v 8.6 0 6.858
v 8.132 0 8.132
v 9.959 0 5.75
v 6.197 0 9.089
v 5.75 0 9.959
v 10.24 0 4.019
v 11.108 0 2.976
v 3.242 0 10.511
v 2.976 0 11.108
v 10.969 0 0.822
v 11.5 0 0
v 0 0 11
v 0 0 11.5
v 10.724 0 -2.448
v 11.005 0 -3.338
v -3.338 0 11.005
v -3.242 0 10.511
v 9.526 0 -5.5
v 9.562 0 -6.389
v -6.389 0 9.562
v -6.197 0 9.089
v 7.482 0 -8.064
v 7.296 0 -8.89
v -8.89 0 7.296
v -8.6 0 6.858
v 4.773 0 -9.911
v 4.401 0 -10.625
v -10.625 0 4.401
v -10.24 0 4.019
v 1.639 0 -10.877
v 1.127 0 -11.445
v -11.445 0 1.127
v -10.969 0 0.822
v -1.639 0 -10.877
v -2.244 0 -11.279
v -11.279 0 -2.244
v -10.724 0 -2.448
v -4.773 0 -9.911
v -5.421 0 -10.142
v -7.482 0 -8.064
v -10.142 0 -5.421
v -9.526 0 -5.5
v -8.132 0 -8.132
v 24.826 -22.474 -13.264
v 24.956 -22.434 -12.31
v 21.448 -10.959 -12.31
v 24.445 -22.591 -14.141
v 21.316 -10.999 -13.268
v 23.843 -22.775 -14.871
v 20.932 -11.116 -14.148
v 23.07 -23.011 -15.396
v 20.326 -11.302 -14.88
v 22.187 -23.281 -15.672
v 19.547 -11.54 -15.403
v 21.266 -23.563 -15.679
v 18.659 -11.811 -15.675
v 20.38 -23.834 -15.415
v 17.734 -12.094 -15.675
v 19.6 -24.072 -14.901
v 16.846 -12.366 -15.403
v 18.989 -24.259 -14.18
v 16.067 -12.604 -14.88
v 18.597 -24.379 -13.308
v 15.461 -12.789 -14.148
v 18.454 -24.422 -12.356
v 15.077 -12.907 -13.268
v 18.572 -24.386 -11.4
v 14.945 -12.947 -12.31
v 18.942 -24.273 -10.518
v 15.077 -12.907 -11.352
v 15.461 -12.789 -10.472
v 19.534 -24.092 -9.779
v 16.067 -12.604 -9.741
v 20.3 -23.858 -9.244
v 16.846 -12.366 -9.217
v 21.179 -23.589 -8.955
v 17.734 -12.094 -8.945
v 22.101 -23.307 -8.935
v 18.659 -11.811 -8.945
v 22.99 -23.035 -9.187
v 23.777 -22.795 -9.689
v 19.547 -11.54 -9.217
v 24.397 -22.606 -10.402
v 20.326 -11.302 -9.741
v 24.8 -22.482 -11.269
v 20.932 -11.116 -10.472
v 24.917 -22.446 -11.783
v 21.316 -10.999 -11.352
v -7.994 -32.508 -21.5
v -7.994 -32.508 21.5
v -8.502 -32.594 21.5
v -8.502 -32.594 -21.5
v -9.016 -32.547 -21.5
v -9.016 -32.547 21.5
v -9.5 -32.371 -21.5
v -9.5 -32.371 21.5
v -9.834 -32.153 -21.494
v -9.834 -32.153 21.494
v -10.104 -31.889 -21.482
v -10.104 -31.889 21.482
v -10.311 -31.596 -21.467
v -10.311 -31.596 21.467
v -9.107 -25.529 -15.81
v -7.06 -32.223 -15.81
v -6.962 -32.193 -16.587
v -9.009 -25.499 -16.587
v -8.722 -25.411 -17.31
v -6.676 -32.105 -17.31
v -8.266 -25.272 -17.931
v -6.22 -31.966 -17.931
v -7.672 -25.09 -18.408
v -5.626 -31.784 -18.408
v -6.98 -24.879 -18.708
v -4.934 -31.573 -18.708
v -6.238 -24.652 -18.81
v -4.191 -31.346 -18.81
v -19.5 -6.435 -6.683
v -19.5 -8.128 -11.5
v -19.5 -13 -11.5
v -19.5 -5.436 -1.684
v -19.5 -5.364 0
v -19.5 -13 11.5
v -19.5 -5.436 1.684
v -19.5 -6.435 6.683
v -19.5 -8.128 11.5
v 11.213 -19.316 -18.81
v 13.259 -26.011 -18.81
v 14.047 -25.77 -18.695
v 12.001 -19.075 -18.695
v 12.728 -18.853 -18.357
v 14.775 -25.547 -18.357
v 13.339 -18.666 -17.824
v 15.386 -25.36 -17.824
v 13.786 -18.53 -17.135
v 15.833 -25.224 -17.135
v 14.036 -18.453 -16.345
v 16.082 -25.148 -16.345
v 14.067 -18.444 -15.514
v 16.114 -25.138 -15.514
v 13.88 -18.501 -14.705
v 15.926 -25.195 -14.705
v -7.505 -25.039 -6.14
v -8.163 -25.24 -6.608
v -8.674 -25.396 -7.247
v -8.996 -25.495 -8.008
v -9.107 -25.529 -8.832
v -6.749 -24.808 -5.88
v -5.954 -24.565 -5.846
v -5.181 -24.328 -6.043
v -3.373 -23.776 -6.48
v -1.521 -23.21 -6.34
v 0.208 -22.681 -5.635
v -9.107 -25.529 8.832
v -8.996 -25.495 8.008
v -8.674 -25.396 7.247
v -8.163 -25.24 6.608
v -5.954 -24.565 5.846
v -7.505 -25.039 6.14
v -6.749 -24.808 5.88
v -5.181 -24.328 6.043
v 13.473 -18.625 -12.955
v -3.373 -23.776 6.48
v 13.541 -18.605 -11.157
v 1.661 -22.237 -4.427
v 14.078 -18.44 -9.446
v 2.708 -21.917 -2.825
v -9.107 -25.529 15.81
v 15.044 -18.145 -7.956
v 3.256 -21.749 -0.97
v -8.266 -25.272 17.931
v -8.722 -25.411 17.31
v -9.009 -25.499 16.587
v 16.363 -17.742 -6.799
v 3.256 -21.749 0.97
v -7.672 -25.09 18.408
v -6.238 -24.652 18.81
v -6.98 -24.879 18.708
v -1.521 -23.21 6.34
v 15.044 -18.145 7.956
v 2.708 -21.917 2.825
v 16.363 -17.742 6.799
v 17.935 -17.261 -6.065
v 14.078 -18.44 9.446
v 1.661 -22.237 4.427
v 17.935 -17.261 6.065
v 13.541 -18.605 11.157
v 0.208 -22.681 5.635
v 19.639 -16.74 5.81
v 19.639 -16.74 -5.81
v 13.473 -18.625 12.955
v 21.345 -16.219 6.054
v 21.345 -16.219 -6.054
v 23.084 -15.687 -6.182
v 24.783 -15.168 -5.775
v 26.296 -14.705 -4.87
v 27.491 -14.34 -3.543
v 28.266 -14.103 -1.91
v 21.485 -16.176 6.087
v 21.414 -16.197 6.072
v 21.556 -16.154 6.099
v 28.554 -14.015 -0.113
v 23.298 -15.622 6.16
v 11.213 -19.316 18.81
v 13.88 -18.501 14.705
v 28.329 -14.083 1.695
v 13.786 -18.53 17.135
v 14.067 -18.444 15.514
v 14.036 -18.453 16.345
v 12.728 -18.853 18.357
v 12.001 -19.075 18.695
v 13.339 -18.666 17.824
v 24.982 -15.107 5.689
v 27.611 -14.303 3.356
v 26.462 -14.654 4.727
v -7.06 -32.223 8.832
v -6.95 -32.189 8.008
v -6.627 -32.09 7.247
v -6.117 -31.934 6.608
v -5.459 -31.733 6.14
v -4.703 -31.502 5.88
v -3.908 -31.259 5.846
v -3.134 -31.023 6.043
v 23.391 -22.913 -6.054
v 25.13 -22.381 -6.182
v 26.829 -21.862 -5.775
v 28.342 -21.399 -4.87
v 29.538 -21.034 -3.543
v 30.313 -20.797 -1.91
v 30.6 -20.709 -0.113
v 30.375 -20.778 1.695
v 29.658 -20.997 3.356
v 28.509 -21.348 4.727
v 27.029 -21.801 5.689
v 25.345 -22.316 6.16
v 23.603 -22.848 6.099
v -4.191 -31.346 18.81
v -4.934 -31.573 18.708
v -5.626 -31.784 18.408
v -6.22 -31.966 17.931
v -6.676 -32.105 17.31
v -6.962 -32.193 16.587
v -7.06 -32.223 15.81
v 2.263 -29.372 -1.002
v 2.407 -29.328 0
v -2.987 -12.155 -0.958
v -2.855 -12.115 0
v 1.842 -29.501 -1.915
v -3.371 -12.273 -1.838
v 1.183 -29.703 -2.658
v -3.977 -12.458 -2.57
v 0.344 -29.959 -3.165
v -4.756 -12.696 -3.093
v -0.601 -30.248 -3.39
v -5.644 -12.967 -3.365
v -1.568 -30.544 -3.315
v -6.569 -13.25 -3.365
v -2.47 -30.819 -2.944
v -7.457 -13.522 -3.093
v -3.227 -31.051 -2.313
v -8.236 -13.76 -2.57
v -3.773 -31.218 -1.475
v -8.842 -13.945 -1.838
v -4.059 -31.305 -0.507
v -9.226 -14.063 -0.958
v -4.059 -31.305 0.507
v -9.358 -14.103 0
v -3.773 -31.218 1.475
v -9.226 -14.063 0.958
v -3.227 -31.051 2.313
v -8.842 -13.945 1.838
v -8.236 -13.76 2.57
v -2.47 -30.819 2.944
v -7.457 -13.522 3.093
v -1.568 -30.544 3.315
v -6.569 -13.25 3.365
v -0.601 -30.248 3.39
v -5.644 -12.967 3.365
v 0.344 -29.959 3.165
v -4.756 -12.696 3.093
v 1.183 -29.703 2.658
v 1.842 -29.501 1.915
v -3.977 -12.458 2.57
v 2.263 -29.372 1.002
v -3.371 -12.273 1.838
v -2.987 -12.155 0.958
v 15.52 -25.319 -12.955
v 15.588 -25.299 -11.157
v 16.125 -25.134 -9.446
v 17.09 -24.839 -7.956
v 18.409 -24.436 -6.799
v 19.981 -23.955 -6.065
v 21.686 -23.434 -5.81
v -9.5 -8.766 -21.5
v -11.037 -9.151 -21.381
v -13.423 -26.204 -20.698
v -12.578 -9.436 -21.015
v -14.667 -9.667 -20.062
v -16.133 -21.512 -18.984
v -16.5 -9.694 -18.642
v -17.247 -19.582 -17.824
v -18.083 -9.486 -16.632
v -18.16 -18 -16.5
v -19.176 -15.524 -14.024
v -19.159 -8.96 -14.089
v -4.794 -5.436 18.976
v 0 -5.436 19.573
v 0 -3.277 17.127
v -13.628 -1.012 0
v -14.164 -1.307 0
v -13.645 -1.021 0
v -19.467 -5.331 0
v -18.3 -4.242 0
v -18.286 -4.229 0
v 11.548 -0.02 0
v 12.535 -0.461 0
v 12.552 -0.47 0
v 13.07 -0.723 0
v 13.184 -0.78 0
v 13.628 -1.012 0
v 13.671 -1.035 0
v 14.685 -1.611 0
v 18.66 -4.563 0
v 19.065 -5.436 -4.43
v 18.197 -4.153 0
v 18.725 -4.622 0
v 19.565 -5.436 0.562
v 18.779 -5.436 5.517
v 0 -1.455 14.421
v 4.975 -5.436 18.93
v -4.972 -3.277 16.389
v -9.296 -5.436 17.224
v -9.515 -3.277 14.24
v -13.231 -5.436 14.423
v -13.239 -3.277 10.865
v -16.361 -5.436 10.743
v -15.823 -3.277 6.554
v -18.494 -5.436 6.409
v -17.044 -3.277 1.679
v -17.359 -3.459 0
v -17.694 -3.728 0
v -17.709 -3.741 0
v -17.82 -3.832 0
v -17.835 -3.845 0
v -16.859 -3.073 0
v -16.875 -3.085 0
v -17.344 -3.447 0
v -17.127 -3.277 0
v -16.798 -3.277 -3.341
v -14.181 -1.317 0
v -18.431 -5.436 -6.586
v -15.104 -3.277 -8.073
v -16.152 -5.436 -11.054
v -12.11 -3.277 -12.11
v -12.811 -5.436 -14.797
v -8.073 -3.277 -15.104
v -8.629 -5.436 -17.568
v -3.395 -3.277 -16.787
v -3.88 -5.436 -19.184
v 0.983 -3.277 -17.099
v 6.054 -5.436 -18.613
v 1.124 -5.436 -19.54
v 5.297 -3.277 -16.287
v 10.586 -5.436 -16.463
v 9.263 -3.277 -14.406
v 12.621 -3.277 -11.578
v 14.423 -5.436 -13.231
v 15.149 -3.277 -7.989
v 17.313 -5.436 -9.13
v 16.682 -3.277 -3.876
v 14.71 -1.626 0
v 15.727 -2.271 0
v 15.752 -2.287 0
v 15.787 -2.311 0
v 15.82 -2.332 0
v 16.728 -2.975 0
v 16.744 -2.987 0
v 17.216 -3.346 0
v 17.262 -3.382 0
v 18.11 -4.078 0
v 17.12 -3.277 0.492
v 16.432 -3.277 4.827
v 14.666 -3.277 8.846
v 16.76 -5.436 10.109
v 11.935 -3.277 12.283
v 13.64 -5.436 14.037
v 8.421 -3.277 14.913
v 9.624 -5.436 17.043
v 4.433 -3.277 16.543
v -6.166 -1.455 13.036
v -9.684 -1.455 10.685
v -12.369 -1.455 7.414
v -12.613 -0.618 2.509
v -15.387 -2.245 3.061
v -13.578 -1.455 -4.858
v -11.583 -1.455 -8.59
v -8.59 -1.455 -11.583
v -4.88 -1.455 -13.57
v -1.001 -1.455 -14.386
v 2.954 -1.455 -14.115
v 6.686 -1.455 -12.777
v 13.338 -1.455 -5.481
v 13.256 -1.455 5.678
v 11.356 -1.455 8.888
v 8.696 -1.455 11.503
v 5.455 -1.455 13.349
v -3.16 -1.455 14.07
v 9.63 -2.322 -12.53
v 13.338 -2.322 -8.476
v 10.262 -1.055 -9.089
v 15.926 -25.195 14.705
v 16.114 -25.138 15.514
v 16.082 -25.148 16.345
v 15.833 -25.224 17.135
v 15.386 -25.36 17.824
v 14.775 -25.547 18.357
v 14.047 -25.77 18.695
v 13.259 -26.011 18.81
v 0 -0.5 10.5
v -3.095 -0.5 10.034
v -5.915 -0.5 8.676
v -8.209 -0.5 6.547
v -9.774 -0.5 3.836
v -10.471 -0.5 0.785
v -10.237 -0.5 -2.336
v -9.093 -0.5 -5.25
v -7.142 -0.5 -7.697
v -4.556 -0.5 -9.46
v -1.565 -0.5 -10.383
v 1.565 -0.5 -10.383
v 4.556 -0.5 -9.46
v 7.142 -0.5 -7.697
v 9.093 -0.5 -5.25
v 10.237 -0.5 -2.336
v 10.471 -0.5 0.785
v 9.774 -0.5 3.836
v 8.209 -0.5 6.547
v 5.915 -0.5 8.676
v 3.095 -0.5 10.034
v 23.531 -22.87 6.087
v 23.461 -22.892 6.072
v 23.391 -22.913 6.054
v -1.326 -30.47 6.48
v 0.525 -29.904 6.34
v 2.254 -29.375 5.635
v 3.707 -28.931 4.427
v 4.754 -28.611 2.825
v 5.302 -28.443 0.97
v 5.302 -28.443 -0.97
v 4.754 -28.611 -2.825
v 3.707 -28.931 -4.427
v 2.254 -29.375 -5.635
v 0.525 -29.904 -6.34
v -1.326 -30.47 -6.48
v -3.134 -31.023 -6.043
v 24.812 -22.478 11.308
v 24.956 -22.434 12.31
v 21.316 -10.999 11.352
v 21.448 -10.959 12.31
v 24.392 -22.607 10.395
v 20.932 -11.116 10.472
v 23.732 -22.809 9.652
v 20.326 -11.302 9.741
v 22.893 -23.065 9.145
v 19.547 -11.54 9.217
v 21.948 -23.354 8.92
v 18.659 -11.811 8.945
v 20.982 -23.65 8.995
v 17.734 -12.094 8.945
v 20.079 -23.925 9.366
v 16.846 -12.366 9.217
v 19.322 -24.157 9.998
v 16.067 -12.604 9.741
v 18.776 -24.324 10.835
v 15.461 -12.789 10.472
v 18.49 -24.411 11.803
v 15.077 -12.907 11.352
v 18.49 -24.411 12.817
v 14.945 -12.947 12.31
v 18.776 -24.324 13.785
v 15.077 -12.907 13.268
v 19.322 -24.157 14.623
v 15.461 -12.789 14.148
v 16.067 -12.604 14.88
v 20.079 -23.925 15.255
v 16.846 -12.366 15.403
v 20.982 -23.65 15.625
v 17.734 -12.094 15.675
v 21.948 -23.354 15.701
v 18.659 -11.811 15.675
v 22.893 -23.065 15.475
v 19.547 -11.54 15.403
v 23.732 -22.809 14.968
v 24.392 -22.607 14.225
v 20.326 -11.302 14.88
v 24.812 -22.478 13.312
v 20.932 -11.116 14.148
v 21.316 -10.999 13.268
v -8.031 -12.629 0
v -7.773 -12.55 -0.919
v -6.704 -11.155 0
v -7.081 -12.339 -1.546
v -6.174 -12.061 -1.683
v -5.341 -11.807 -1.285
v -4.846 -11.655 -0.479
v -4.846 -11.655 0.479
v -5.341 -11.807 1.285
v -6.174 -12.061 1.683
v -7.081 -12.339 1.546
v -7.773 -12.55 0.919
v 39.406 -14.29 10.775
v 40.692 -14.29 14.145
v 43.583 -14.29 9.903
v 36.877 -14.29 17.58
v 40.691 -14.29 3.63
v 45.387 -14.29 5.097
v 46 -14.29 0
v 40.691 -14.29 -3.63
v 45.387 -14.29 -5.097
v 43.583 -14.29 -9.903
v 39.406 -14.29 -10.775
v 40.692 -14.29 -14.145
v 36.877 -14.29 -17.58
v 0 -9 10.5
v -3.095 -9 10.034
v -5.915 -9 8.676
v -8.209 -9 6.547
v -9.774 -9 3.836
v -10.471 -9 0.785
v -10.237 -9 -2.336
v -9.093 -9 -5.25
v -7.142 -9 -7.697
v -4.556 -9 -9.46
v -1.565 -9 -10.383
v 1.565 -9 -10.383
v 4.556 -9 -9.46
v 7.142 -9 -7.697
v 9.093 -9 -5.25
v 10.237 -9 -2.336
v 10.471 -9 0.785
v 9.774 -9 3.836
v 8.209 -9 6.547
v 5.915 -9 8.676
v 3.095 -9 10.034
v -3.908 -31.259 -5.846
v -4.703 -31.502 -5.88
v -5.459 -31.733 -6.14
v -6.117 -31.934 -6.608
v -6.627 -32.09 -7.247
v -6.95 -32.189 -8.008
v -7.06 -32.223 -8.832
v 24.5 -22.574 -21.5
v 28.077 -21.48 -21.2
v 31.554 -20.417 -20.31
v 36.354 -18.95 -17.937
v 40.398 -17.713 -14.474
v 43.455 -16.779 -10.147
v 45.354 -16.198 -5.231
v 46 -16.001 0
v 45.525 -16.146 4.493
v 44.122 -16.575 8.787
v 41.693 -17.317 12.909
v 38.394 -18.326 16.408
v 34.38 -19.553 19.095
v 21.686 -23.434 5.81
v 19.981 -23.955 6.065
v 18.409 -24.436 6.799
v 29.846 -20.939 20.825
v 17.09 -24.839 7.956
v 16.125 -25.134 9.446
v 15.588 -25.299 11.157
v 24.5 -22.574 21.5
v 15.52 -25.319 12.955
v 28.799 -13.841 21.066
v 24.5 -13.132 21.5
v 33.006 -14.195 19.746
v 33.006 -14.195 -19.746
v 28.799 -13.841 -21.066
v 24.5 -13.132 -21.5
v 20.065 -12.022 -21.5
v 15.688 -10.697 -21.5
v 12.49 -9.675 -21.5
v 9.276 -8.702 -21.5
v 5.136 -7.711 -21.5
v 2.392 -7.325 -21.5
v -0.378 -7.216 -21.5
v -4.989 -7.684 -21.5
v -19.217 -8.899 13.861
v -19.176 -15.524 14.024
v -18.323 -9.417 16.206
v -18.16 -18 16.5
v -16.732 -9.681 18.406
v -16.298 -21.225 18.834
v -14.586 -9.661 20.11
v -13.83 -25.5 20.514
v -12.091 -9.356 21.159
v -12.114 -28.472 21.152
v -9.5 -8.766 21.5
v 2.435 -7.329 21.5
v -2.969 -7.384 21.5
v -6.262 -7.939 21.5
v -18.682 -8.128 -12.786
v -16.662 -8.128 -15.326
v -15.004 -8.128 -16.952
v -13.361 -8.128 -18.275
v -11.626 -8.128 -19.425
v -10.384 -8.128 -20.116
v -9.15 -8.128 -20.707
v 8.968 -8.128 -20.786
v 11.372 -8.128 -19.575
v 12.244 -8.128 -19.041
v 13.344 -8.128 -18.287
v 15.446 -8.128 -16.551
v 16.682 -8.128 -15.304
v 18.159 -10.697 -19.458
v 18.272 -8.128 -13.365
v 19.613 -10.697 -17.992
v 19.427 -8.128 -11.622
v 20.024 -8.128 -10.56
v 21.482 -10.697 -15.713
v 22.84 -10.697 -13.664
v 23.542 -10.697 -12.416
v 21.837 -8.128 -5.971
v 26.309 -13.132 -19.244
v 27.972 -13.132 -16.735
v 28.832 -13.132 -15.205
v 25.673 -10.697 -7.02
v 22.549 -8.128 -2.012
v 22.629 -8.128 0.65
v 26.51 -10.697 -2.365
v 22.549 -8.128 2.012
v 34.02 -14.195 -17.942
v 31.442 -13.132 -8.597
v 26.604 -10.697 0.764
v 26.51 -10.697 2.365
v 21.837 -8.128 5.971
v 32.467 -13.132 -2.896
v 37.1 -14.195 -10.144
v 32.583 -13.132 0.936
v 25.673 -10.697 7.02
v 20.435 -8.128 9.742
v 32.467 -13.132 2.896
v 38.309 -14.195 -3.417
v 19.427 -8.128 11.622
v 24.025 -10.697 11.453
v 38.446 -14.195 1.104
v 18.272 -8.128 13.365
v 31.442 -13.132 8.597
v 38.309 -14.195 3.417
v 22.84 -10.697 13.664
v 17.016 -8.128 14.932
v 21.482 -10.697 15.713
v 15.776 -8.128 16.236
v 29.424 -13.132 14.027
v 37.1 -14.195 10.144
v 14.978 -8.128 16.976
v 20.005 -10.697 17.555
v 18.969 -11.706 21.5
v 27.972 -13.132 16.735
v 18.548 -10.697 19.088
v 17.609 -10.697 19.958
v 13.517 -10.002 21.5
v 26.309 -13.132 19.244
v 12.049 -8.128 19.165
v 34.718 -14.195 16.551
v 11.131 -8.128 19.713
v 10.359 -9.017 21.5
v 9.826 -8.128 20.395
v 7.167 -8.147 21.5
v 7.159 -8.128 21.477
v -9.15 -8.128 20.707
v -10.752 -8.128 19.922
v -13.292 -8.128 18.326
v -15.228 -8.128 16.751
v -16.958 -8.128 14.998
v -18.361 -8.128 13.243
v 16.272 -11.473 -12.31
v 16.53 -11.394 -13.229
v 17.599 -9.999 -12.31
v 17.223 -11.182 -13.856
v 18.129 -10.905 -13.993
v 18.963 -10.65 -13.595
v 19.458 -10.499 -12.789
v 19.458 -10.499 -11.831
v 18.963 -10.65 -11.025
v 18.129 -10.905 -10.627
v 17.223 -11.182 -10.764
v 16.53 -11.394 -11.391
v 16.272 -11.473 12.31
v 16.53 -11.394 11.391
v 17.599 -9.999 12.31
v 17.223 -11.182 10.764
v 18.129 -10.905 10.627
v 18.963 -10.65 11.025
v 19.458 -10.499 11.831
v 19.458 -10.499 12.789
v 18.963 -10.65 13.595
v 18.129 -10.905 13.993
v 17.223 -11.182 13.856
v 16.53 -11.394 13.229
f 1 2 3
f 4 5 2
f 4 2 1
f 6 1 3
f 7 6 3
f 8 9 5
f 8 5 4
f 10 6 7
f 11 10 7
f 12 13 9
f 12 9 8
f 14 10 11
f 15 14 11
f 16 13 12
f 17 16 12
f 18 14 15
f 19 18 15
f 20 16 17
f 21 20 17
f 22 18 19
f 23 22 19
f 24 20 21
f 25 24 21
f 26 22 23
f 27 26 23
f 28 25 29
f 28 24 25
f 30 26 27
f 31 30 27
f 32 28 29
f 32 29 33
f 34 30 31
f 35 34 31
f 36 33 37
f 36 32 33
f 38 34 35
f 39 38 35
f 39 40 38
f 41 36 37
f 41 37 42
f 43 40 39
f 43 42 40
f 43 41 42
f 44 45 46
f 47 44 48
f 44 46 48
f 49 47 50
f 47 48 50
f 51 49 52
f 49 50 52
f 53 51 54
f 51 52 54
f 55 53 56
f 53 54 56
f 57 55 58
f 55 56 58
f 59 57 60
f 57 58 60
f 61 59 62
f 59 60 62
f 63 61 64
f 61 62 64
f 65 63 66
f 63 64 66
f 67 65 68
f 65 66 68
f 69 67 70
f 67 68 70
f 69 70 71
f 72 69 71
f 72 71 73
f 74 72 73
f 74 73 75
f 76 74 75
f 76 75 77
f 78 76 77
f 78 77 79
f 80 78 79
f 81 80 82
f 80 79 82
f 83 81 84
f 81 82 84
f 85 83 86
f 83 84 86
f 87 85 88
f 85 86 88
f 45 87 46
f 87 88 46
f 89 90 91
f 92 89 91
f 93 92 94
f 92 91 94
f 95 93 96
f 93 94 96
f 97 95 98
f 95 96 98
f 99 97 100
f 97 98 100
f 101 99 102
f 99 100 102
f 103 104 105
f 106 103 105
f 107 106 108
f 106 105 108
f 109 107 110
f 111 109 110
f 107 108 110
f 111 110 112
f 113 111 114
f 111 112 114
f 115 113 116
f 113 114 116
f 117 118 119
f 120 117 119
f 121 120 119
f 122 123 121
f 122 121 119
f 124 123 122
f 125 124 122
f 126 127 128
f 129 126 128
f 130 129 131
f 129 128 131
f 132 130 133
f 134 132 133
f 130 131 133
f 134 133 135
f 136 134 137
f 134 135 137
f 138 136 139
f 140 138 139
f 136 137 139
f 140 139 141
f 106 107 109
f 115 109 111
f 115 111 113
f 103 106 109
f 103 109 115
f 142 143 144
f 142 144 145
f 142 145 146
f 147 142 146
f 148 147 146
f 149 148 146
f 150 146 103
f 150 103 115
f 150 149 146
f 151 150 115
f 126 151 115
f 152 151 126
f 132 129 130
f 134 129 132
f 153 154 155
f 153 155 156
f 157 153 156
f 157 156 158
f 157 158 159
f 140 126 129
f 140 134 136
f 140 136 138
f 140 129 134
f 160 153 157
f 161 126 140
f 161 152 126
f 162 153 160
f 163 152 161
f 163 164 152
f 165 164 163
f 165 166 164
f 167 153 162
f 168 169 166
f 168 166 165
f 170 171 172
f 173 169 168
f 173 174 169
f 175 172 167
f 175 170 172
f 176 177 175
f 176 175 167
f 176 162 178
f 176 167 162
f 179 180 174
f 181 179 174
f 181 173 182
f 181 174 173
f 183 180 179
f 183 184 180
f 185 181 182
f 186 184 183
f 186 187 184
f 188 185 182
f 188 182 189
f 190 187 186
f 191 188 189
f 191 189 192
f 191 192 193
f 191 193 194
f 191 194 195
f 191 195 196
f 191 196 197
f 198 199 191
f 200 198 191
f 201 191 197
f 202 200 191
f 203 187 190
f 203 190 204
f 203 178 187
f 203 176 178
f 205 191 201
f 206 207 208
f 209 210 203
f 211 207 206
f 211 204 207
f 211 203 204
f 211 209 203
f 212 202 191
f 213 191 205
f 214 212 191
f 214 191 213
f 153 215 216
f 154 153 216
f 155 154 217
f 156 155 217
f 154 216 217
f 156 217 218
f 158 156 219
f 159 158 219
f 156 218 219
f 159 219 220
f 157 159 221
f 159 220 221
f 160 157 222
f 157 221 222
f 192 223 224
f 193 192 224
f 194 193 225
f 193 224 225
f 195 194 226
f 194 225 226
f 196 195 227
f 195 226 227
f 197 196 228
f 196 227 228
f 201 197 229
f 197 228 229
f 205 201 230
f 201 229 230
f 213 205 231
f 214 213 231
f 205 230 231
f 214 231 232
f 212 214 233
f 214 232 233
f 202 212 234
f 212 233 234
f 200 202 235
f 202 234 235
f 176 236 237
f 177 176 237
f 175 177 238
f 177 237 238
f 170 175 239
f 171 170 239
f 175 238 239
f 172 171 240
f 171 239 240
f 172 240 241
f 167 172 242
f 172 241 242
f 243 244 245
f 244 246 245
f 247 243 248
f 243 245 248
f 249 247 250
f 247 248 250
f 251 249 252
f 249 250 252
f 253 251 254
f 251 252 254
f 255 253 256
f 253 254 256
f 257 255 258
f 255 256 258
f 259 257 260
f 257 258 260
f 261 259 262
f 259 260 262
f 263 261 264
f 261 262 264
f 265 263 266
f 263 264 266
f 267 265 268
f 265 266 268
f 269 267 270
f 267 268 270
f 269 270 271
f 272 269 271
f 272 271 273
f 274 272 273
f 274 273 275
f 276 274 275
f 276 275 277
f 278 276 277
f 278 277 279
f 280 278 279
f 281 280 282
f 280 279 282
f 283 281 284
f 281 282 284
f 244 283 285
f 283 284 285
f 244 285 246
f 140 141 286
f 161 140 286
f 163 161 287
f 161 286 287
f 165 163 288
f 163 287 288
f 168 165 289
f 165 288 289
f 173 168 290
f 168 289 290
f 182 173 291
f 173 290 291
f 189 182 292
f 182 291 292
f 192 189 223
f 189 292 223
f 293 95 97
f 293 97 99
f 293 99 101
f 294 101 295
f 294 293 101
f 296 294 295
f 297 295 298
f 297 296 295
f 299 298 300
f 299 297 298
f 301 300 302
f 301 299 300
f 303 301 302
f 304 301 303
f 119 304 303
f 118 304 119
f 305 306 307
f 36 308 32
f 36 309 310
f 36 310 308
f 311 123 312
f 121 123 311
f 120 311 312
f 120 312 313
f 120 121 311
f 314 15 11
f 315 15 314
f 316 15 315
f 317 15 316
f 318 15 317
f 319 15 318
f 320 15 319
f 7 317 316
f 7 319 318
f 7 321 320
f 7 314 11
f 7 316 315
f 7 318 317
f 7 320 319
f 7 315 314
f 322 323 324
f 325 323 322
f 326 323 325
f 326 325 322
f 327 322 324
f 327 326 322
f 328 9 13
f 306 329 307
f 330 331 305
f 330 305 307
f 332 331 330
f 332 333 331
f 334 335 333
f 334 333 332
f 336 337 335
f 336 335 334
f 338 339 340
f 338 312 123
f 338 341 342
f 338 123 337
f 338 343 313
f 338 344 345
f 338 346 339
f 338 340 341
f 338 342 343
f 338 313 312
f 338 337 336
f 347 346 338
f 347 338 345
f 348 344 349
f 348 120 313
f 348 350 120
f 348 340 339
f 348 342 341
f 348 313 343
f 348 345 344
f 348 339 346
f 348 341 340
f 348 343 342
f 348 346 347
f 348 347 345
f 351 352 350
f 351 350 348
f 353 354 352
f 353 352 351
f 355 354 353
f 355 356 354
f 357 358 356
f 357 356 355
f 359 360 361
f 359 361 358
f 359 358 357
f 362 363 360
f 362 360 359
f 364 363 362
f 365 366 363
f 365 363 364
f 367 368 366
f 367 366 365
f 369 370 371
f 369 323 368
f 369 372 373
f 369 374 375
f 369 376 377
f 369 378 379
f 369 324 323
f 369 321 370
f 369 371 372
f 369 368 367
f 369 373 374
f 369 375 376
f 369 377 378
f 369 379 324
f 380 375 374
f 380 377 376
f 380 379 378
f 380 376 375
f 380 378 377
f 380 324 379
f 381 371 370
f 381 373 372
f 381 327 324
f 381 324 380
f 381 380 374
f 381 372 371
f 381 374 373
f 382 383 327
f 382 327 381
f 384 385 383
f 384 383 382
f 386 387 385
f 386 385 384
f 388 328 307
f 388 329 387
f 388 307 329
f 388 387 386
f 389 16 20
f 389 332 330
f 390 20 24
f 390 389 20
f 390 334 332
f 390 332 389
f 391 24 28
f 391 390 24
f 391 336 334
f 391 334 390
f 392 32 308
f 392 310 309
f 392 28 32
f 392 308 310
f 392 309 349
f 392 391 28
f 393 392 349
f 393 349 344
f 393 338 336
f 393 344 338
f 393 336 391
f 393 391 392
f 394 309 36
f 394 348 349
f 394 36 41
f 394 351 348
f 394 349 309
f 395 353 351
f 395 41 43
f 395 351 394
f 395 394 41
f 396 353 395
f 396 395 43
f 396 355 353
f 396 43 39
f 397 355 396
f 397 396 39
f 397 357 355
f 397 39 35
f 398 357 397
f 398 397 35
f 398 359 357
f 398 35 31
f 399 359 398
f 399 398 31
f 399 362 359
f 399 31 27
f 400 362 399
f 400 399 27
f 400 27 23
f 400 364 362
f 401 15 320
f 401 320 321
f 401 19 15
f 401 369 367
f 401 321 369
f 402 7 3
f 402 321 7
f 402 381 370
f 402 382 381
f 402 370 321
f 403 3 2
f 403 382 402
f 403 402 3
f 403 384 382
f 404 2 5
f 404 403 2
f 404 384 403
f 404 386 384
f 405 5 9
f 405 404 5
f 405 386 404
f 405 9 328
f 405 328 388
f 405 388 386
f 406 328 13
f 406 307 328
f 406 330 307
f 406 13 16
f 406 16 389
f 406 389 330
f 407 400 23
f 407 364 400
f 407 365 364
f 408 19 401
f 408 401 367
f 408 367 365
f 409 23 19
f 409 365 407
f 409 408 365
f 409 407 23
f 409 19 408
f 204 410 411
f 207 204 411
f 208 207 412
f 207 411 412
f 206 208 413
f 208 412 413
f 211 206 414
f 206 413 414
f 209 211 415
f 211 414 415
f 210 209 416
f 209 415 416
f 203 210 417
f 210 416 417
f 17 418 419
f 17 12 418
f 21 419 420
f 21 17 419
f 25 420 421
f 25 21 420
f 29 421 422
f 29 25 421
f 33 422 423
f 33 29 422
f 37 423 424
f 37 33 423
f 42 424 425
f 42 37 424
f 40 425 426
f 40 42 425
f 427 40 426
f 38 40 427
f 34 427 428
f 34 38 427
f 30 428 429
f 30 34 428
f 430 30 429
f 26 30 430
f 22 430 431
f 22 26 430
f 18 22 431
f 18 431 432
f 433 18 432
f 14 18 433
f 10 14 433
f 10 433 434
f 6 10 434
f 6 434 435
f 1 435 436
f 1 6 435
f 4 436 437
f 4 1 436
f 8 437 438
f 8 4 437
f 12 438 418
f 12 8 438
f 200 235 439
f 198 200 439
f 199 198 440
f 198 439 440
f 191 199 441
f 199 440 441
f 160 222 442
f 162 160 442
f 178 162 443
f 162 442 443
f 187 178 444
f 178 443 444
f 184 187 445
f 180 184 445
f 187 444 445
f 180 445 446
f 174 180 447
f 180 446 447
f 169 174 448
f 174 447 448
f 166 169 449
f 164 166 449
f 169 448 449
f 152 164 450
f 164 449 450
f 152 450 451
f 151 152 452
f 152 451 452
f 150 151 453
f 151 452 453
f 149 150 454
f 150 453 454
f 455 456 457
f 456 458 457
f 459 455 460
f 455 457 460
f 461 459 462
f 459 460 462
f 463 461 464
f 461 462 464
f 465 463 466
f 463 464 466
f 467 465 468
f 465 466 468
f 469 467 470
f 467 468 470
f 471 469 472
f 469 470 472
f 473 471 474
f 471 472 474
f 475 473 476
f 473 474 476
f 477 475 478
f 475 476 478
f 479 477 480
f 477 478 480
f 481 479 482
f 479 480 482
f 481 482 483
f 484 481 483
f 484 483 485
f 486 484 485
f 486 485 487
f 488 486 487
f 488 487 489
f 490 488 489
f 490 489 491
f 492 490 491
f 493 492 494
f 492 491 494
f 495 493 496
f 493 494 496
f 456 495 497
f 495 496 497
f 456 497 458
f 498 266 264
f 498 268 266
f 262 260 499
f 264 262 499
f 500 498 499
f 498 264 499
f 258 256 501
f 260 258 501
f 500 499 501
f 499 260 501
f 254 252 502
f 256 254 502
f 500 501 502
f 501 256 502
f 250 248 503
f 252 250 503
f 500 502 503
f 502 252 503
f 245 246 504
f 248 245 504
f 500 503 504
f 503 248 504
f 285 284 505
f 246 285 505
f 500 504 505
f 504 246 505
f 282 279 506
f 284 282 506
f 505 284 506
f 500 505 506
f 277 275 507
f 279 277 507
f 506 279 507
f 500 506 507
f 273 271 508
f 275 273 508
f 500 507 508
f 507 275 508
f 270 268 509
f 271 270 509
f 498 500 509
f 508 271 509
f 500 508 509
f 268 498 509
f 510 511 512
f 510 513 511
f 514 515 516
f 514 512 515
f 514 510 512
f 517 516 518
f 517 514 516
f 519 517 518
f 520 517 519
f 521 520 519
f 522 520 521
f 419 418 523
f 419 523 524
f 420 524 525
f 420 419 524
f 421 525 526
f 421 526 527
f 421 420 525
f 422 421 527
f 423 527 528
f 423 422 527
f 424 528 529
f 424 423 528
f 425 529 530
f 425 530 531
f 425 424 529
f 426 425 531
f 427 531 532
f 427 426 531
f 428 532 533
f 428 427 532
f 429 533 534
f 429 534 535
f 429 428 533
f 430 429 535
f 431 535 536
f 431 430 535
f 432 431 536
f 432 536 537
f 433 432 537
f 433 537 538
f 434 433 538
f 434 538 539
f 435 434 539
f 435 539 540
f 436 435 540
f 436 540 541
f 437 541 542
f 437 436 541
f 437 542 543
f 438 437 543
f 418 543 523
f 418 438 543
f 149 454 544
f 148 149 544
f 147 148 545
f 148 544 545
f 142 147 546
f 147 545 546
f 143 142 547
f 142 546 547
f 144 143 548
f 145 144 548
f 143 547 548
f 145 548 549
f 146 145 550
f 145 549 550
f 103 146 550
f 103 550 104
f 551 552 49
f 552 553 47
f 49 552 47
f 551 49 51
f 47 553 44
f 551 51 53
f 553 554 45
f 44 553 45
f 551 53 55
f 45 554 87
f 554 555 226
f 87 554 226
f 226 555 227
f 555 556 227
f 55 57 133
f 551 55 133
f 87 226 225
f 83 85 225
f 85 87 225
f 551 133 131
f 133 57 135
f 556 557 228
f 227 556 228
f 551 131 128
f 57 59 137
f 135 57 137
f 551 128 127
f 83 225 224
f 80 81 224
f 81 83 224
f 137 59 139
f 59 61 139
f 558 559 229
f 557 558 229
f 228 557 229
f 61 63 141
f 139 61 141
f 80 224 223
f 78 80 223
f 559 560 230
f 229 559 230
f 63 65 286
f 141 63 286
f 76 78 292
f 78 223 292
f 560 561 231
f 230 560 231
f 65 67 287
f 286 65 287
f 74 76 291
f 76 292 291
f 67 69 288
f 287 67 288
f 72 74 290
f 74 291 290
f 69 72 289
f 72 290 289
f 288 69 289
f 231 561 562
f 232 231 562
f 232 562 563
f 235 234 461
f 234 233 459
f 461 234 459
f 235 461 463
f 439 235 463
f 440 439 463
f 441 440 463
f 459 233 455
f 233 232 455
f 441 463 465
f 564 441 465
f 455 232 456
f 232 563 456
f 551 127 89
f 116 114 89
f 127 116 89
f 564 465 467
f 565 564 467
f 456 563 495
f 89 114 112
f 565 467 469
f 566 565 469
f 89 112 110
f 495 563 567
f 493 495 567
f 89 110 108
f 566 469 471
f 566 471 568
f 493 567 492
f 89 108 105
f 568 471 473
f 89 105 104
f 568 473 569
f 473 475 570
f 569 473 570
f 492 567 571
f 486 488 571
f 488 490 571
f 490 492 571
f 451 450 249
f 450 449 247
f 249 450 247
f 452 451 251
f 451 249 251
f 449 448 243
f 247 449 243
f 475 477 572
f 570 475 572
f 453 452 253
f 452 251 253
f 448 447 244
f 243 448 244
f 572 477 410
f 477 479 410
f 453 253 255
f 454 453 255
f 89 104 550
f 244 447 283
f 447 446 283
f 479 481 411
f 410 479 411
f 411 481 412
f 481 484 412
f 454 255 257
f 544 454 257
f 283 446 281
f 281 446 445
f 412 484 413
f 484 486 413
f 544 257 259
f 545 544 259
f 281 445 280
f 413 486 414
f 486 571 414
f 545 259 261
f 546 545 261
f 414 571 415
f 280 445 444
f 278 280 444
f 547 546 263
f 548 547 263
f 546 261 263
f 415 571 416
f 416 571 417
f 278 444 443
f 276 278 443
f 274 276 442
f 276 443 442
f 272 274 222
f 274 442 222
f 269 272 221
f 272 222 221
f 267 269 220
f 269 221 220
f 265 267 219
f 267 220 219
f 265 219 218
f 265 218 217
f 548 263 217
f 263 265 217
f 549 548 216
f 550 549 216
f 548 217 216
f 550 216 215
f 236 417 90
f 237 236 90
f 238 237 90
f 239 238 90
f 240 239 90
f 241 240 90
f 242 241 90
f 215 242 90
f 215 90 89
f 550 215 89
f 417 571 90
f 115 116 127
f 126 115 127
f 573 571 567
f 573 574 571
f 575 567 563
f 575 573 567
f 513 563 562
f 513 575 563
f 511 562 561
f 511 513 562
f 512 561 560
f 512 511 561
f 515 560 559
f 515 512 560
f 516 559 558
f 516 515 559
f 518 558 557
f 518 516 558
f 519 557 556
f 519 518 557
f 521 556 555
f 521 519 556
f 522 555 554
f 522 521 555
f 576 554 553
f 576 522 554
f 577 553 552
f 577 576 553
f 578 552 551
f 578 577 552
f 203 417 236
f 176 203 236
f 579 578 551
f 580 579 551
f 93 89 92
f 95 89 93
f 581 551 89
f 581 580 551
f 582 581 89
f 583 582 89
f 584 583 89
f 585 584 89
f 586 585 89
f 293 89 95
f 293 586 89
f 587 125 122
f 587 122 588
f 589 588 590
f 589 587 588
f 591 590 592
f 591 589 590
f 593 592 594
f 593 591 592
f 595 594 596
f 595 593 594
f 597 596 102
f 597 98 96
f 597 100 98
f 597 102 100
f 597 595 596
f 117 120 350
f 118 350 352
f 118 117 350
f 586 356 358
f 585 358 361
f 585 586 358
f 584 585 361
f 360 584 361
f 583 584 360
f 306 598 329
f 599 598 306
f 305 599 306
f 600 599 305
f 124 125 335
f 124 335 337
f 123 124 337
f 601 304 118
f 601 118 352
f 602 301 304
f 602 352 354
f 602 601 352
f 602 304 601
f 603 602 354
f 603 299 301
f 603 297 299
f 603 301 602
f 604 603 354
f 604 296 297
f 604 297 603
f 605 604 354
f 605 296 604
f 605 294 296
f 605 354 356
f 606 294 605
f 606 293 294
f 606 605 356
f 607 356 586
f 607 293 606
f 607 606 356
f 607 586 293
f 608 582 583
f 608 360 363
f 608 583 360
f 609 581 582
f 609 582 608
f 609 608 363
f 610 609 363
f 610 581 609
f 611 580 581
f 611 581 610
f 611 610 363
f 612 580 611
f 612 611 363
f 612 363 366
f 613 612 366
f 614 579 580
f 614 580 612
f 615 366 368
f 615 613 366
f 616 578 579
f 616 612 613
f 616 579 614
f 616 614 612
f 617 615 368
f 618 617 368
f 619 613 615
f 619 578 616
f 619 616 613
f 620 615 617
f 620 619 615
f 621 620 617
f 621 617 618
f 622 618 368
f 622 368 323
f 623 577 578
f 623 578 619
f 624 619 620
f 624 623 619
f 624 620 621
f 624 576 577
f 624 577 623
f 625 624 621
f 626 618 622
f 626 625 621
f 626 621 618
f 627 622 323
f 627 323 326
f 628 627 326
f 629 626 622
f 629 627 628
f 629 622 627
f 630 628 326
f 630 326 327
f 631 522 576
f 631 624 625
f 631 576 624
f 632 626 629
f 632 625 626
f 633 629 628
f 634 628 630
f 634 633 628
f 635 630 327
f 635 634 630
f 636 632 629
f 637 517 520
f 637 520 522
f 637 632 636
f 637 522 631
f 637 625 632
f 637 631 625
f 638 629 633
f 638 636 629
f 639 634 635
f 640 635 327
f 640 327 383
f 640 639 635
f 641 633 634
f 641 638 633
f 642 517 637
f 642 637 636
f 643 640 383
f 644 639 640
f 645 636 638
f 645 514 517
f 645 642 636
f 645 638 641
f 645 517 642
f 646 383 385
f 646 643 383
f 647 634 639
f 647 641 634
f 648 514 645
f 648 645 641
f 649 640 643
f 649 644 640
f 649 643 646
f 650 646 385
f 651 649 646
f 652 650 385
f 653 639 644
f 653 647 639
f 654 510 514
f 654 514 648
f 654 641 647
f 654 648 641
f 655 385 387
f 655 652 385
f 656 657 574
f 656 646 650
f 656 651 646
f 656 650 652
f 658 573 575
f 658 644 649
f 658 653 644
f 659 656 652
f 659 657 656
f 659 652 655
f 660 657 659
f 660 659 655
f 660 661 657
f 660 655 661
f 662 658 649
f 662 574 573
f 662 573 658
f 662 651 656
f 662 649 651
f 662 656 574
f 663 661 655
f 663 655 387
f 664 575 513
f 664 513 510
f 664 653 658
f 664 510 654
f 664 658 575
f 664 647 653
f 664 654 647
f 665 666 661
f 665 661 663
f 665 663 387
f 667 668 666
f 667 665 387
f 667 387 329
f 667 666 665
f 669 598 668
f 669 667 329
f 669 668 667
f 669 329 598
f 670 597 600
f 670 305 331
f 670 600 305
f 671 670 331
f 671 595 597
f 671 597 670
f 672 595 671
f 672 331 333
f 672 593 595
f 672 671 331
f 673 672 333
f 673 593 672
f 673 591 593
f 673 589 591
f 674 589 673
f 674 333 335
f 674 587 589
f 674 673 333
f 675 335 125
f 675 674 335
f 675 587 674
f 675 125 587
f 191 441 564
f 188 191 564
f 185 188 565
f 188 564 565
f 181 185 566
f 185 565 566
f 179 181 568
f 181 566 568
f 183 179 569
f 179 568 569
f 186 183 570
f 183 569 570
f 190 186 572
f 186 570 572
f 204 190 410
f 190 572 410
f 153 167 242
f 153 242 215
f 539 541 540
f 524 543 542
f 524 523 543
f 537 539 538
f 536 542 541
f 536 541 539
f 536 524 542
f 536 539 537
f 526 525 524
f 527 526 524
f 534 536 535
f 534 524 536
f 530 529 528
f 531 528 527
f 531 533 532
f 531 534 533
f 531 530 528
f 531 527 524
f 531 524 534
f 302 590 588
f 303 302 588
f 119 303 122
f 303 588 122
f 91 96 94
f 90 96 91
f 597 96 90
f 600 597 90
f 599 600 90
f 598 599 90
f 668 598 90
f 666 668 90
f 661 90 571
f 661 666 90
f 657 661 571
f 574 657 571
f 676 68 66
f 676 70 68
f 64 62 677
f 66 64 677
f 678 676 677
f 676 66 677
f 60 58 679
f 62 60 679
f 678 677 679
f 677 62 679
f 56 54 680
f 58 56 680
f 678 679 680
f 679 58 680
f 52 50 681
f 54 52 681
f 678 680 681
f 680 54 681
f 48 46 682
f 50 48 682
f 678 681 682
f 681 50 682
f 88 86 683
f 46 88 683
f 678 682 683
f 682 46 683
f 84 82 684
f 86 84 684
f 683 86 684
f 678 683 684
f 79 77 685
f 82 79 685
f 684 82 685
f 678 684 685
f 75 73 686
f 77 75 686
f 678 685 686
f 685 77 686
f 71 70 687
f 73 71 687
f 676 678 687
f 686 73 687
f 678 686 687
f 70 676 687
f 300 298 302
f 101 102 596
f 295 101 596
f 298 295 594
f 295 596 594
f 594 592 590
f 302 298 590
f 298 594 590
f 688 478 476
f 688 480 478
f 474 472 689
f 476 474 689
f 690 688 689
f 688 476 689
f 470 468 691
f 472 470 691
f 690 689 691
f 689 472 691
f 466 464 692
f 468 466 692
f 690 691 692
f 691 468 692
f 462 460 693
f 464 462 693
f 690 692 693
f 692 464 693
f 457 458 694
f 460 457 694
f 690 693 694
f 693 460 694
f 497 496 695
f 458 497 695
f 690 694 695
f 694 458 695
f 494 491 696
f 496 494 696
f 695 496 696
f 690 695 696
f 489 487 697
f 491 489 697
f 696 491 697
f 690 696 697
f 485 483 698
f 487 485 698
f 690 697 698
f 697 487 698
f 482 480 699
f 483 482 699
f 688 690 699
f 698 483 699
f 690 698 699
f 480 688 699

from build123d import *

# Parameters (mm, degrees)
IZIM2_OUTSIDE_W                      = 120.946
IZIM2_OUTSIDE_H                      = 120.946
KES_EKSTR_ZYON1_DEPTH                = 40
IZIM3_OUTSIDE_W                      = 84.664
IZIM3_OUTSIDE_H                      = 54.164
KES_EKSTR_ZYON2_DEPTH                = 30
Y_KSEKLIK_EKSTR_ZYON2_START          = 9
IZIM11_R                             = 10.5
Y_KSEKLIK_EKSTR_ZYON2_DEPTH          = 9
M8X1_25_DI_LI_DELIK1_D               = 6.8
M8X1_25_DI_LI_DELIK1_DEPTH           = 18
M8X1_25_DI_LI_DELIK1_TIP             = 2.042926105
M8X1_25_DI_LI_DELIK2_D               = 6.8
M8X1_25_DI_LI_DELIK2_DEPTH           = 12
M8X1_25_DI_LI_DELIK2_TIP             = 2.042926105
M8X1_25_DI_LI_DELIK2_ON_FACE_2_D     = 6.8
M8X1_25_DI_LI_DELIK2_ON_FACE_2_DEPTH = 12
M8X1_25_DI_LI_DELIK2_ON_FACE_2_TIP   = 2.042926105
KES_EKSTR_ZYON3_DEPTH                = 7


with BuildPart() as part:
    # Çizim1 → Döndür1 (revolve)
    with BuildSketch(Plane.XY, mode=Mode.PRIVATE) as d_nd_r1_sk:
        with BuildLine():
            Line((0, -35), (0, -18))
            Line((0, -18), (8.5, -18))
            Line((8.5, -18), (8.5, -9))
            Line((8.5, -9), (10.5, -9))
            Line((10.5, -9), (10.5, -0.5))
            Line((10.5, -0.5), (11, 0))
            Line((11, 0), (11.5, 0))
            ThreePointArc((11.5, 0), (15.803393463, -2.321536849), (19.572591816, -5.436319733))
            ThreePointArc((19.572591816, -5.436319733), (29.328522406, -11.988638081), (40.852954694, -14.290489038))
            Line((40.852954694, -14.290489038), (46, -14.290489038))
            Line((46, -14.290489038), (46, -35))
            Line((46, -35), (0, -35))
        make_face()
    revolve(d_nd_r1_sk.sketch.rotate(Axis((0, 4.884743134, 0), (0, -1, 0)), 90), axis=Axis((0, 4.884743134, 0), (0, -1, 0)))

    # Çizim2 outside → Kes-Ekstrüzyon1 (cut)
    with BuildSketch(Plane(origin=(0, 0, 0), x_dir=(1, 0, 0), z_dir=(0, 1, 0))):
        Rectangle(IZIM2_OUTSIDE_W, IZIM2_OUTSIDE_H)
        with BuildLine():
            Line((-19.5, 11.5), (-19.5, -11.5))
            ThreePointArc((-19.5, -11.5), (-16.571067812, -18.571067812), (-9.5, -21.5))
            Line((-9.5, -21.5), (24.5, -21.5))
            ThreePointArc((24.5, -21.5), (46, 0), (24.5, 21.5))
            Line((24.5, 21.5), (-9.5, 21.5))
            ThreePointArc((-9.5, 21.5), (-16.571067812, 18.571067812), (-19.5, 11.5))
        make_face(mode=Mode.SUBTRACT)
    extrude(amount=-KES_EKSTR_ZYON1_DEPTH, mode=Mode.SUBTRACT)

    # Çizim3 outside → Kes-Ekstrüzyon2 (cut, symmetric)
    with BuildSketch(Plane.XY):
        with Locations((13.25, -17.5)):
            Rectangle(IZIM3_OUTSIDE_W, IZIM3_OUTSIDE_H)
        with BuildLine():
            Line((-19.5, -13), (-19.5, -5.36356579))
            ThreePointArc((-19.5, -5.36356579), (-15.760740466, -2.292876744), (-11.5, 0))
            Line((-11.5, 0), (11.5, 0))
            ThreePointArc((11.5, 0), (15.803393463, -2.321536849), (19.572591816, -5.436319733))
            ThreePointArc((19.572591816, -5.436319733), (29.328522406, -11.988638081), (40.852954694, -14.290489038))
            Line((40.852954694, -14.290489038), (46, -14.290489038))
            Line((46, -14.290489038), (46, -16.000690448))
            Line((46, -16.000690448), (-7.993980308, -32.508306842))
            ThreePointArc((-7.993980308, -32.508306842), (-9.31172617, -32.456532466), (-10.310774525, -31.59569733))
            Line((-10.310774525, -31.59569733), (-18.160254038, -18))
            ThreePointArc((-18.160254038, -18), (-19.159258263, -15.588190451), (-19.5, -13))
        make_face(mode=Mode.SUBTRACT)
    extrude(amount=KES_EKSTR_ZYON2_DEPTH, both=True, mode=Mode.SUBTRACT)

    # Çizim11 → Yükseklik-Ekstrüzyon2 (add)
    with BuildSketch(Plane(origin=(0, -18, 0), x_dir=(1, 0, 0), z_dir=(0, 1, 0)).offset(Y_KSEKLIK_EKSTR_ZYON2_START)):
        with Locations(Location((0, 0, 0), (0, 0, 270))):
            Circle(IZIM11_R)
    extrude(amount=-Y_KSEKLIK_EKSTR_ZYON2_DEPTH)

    # M8x1.25 Dişli Delik1
    with Locations(Plane(origin=(-0.844028469, -30.322347194, 0), x_dir=(-0.956304755963, -0.292371704723, 0), z_dir=(0.292371704723, -0.956304755963, 0))):
        with Locations((0, 0)):
            Hole(M8X1_25_DI_LI_DELIK1_D / 2, depth=M8X1_25_DI_LI_DELIK1_DEPTH)
            with Locations((0, 0, -(M8X1_25_DI_LI_DELIK1_DEPTH + M8X1_25_DI_LI_DELIK1_TIP / 2))):  # 118° drill point
                Cone(0, M8X1_25_DI_LI_DELIK1_D / 2, M8X1_25_DI_LI_DELIK1_TIP, mode=Mode.SUBTRACT)

    # M8x1.25 Dişli Delik2
    with Locations(Plane(origin=(21.70506177, -23.428398469, 12.310096913), x_dir=(-0.956304755963, -0.292371704723, 0), z_dir=(0.292371704723, -0.956304755963, 0))):
        with Locations((0, 0)):
            Hole(M8X1_25_DI_LI_DELIK2_D / 2, depth=M8X1_25_DI_LI_DELIK2_DEPTH)
            with Locations((0, 0, -(M8X1_25_DI_LI_DELIK2_DEPTH + M8X1_25_DI_LI_DELIK2_TIP / 2))):  # 118° drill point
                Cone(0, M8X1_25_DI_LI_DELIK2_D / 2, M8X1_25_DI_LI_DELIK2_TIP, mode=Mode.SUBTRACT)

    # M8x1.25 Dişli Delik2 on face 2
    with Locations(Plane(origin=(21.70506177, -23.428398469, -12.310096913), x_dir=(-0.956304694265, -0.292371906527, 0), z_dir=(0.292371906527, -0.956304694265, 0))):
        with Locations((0, 0)):
            Hole(M8X1_25_DI_LI_DELIK2_ON_FACE_2_D / 2, depth=M8X1_25_DI_LI_DELIK2_ON_FACE_2_DEPTH)
            with Locations((0, 0, -(M8X1_25_DI_LI_DELIK2_ON_FACE_2_DEPTH + M8X1_25_DI_LI_DELIK2_ON_FACE_2_TIP / 2))):  # 118° drill point
                Cone(0, M8X1_25_DI_LI_DELIK2_ON_FACE_2_D / 2, M8X1_25_DI_LI_DELIK2_ON_FACE_2_TIP, mode=Mode.SUBTRACT)

    # Çizim16 → Kes-Ekstrüzyon3 (cut)
    with BuildSketch(Plane(origin=(8.405872106, -27.494368788, 0), x_dir=(0.956304755963042, 0.2923717047227155, 0), z_dir=(0.29237170472271556, -0.9563047559630421, 0))):
        with BuildLine():
            Line((-16.172544779, -8.831760866), (-16.172544779, -15.810096913))
            ThreePointArc((-16.172544779, -15.810096913), (-15.293865123, -17.931417256), (-13.172544779, -18.810096913))
            Line((-13.172544779, -18.810096913), (5.075092134, -18.810096913))
            ThreePointArc((5.075092134, -18.810096913), (7.556602709, -17.495951373), (7.864069249, -14.704833755))
            ThreePointArc((7.864069249, -14.704833755), (9.081050216, -7.955601822), (15.670169023, -6.053842714))
            ThreePointArc((15.670169023, -6.053842714), (23.208480374, -0.112690383), (15.891078456, 6.098513866))
            ThreePointArc((15.891078456, 6.098513866), (15.779783551, 6.080333222), (15.670169023, 6.053842714))
            ThreePointArc((15.670169023, 6.053842714), (9.081050216, 7.955601822), (7.864069249, 14.704833755))
            ThreePointArc((7.864069249, 14.704833755), (7.556602709, 17.495951374), (5.075092134, 18.810096913))
            Line((5.075092134, 18.810096913), (-13.172544779, 18.810096913))
            ThreePointArc((-13.172544779, 18.810096913), (-15.293865123, 17.931417256), (-16.172544779, 15.810096913))
            Line((-16.172544779, 15.810096913), (-16.172544779, 8.831760866))
            ThreePointArc((-16.172544779, 8.831760866), (-14.85839924, 6.350250291), (-12.067281621, 6.042783751))
            ThreePointArc((-12.067281621, 6.042783751), (-3.172544779, 0), (-12.067281621, -6.042783751))
            ThreePointArc((-12.067281621, -6.042783751), (-14.85839924, -6.350250291), (-16.172544779, -8.831760866))
        make_face()
    extrude(amount=-KES_EKSTR_ZYON3_DEPTH, mode=Mode.SUBTRACT)


solid = part.part
